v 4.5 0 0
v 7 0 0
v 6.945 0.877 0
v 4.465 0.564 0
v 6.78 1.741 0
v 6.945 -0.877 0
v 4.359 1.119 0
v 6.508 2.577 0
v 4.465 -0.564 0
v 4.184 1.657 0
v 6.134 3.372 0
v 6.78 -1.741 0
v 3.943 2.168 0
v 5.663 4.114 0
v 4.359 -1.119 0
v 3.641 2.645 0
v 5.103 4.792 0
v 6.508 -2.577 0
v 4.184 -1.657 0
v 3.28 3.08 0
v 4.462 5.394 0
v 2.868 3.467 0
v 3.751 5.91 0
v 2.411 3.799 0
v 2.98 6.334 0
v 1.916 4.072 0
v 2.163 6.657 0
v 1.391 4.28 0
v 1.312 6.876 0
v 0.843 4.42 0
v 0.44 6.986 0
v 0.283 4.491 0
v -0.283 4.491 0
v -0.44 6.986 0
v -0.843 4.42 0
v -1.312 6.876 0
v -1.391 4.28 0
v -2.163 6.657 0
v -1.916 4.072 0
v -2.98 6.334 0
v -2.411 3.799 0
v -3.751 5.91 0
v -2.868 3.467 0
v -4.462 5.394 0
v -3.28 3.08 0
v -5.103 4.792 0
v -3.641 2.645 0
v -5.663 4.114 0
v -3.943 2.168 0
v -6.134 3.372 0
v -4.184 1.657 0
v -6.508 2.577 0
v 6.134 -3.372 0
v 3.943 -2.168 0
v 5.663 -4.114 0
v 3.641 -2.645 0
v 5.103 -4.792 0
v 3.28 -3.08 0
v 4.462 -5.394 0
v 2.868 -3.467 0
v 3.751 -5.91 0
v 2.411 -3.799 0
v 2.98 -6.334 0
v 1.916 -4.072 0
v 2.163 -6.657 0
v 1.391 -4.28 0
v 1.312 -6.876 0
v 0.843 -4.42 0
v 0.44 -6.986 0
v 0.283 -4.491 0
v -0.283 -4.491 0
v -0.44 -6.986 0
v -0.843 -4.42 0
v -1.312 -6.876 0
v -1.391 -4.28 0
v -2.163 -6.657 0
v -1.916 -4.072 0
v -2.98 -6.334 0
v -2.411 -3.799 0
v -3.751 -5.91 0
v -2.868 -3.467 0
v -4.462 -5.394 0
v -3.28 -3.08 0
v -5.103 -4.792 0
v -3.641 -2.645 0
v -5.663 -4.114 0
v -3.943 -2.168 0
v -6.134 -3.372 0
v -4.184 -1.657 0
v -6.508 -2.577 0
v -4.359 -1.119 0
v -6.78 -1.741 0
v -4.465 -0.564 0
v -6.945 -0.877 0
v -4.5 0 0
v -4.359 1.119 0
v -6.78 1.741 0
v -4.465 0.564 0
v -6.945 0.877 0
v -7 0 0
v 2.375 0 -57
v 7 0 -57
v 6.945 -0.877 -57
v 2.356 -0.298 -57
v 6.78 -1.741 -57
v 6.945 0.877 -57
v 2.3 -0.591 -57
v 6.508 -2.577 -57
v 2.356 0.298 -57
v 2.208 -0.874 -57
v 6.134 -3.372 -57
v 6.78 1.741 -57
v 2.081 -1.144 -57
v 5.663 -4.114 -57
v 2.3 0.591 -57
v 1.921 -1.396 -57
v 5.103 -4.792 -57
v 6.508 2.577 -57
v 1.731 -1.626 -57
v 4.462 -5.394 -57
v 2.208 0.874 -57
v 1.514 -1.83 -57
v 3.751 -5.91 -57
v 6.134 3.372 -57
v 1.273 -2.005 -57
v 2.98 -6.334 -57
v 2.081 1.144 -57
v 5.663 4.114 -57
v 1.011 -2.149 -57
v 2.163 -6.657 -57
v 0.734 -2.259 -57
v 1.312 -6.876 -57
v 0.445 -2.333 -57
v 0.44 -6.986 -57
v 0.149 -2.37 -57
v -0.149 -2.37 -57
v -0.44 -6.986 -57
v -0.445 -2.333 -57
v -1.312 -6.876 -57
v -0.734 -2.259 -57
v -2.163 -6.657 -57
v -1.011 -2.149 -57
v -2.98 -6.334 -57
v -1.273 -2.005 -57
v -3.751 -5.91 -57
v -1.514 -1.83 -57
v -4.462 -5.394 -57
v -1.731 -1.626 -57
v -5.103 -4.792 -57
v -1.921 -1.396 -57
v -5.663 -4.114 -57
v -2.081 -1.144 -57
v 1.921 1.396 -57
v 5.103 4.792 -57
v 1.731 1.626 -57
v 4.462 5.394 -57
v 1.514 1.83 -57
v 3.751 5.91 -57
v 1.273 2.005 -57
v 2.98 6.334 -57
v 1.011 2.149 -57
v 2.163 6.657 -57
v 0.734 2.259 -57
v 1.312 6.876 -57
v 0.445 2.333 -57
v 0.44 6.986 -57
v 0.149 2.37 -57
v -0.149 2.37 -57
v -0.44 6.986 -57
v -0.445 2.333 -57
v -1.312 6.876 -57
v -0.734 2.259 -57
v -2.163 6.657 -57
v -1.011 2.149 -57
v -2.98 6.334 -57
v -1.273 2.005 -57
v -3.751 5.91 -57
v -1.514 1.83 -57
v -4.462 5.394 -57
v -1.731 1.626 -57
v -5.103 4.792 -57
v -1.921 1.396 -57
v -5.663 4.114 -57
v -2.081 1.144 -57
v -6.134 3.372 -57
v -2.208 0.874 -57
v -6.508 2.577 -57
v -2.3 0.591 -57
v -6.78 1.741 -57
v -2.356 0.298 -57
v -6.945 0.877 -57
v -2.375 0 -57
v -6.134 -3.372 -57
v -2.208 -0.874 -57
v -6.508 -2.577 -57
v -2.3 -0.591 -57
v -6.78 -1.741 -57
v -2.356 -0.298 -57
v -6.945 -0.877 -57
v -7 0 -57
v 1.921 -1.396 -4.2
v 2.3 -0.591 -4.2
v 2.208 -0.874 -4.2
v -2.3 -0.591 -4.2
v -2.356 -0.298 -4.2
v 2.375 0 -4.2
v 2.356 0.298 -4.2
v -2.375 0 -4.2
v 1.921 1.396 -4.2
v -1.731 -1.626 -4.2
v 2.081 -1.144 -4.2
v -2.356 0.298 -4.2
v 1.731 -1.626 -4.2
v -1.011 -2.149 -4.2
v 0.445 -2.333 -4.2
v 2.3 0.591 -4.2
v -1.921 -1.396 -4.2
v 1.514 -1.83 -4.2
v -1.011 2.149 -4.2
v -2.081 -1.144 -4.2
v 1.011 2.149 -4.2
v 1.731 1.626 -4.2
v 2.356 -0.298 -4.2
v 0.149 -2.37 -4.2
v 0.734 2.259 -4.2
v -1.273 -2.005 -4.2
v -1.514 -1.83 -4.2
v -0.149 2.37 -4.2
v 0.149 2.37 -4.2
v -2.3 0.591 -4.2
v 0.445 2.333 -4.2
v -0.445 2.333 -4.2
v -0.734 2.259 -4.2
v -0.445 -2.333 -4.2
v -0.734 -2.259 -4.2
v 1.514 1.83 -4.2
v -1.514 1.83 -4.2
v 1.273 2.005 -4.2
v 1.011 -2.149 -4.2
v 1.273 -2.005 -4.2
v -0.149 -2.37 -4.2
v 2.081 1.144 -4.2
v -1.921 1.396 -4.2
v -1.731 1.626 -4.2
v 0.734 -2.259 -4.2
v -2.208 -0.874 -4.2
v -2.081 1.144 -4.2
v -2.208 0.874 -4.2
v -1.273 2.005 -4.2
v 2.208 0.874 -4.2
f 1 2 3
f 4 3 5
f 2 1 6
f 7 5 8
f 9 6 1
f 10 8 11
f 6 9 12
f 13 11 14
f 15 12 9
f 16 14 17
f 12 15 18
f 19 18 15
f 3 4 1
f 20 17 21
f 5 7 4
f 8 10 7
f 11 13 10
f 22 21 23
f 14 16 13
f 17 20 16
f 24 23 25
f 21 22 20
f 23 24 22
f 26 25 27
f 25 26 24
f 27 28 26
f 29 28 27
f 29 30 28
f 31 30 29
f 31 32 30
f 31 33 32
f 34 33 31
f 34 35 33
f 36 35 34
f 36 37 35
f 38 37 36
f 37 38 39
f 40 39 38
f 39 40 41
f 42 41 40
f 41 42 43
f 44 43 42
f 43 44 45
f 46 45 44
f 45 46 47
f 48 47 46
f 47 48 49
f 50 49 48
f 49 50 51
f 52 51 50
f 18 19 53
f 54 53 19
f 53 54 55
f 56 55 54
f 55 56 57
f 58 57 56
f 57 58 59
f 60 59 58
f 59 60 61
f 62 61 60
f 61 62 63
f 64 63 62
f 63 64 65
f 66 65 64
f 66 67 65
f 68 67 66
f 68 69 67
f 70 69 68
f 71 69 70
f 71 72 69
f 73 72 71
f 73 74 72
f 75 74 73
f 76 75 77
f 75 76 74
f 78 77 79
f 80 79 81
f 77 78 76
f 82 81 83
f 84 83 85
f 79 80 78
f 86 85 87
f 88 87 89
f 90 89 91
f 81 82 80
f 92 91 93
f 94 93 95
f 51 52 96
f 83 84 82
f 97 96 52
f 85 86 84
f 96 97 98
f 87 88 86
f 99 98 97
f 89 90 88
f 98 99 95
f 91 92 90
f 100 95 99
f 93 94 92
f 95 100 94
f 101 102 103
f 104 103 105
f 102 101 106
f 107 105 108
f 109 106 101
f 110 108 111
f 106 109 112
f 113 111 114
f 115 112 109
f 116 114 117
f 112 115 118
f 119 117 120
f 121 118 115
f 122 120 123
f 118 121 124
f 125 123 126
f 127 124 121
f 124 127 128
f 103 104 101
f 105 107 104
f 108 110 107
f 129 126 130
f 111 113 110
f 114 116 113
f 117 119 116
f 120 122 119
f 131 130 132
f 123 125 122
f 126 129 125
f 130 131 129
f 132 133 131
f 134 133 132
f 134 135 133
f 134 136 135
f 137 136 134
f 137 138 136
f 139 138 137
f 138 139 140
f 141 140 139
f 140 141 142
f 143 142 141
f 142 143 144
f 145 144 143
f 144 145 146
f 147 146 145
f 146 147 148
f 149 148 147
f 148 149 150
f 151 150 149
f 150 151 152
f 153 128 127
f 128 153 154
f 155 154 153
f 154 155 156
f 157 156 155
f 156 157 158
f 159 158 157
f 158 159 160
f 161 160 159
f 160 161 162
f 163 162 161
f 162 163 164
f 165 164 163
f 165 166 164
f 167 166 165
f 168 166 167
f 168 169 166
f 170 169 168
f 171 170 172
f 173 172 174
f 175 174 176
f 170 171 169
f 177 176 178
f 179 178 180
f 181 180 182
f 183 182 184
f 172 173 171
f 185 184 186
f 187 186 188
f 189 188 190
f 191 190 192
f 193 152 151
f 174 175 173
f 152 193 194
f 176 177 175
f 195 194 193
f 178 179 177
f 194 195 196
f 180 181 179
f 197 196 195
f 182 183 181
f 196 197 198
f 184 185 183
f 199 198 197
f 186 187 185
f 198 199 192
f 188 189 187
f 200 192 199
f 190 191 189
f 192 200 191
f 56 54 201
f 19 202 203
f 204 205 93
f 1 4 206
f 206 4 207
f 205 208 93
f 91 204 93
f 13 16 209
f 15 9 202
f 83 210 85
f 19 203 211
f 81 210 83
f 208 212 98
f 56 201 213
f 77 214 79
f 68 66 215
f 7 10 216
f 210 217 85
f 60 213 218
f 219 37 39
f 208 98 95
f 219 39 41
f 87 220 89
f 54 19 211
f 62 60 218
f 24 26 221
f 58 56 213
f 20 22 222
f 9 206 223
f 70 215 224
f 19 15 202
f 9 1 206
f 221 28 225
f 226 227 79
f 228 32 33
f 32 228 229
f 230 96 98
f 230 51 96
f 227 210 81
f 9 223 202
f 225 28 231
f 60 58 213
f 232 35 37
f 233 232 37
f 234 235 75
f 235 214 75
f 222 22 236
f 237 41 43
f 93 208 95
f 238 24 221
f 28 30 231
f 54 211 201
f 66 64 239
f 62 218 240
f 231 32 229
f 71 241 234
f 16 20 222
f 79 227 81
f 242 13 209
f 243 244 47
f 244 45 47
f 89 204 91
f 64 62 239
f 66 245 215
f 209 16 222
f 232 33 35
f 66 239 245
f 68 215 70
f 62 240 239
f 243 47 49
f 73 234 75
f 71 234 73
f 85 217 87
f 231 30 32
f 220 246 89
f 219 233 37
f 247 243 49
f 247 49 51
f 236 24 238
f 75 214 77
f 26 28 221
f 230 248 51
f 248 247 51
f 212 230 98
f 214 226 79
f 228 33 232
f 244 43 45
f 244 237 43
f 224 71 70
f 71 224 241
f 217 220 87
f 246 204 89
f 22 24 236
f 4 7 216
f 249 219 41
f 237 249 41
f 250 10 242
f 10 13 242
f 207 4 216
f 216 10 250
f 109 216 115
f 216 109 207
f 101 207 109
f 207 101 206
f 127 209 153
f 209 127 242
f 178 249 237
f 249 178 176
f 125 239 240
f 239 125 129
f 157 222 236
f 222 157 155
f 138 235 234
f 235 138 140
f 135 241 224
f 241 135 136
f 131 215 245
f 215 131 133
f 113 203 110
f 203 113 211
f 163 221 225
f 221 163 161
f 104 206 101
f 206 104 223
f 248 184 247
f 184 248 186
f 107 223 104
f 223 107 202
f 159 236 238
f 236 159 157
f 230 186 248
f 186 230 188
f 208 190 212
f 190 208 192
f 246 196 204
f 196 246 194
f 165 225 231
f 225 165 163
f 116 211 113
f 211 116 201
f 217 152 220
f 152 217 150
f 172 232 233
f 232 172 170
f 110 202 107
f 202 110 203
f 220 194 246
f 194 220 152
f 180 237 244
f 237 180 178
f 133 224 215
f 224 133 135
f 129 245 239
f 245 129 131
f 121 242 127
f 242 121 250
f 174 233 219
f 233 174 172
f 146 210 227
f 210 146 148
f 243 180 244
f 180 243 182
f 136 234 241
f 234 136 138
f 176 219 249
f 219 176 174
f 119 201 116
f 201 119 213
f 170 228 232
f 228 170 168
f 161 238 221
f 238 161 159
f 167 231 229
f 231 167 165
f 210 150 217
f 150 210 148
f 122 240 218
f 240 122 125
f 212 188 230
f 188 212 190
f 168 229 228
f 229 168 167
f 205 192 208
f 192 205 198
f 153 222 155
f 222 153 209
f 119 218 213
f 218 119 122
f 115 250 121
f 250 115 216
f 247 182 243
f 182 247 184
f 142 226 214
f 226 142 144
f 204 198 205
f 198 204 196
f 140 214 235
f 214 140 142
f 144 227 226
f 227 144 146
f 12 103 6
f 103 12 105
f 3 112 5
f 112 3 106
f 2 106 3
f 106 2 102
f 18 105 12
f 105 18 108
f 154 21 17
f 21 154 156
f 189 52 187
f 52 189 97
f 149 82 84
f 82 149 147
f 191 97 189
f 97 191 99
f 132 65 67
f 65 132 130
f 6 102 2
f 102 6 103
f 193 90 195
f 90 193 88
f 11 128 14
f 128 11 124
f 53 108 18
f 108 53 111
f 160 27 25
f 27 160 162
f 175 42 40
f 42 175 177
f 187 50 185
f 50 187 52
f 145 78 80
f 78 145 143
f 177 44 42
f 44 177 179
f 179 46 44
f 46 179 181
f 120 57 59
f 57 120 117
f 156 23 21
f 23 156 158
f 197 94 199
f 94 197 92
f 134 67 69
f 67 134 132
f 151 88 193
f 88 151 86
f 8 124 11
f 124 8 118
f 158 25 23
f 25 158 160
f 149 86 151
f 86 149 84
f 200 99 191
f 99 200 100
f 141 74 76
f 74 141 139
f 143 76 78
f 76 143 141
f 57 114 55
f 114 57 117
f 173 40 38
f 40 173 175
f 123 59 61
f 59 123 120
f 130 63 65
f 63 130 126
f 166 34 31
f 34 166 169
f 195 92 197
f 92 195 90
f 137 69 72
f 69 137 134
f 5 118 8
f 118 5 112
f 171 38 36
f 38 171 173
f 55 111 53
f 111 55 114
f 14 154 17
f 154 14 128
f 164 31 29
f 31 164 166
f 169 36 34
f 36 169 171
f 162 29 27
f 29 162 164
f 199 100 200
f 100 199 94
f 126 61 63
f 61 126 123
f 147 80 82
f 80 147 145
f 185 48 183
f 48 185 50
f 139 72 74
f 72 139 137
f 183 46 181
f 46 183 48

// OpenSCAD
$fn = 50;


difference() {
	union() {
		translate(v = [0, 0, -57.0000000000]) {
			cylinder(h = 57, r = 7.0000000000);
		}
		cylinder(h = 0, r = 13.0000000000);
	}
	union() {
		translate(v = [0, 0, 0]) {
			rotate(a = [0, 0, 0]) {
				difference() {
					union() {
						#translate(v = [0, 0, -57.0000000000]) {
							cylinder(h = 57, r = 2.2500000000);
						}
						#translate(v = [0, 0, -4.2000000000]) {
							cylinder(h = 4.2000000000, r = 7.0000000000, r1 = 2.3750000000, r2 = 4.5000000000);
						}
						#translate(v = [0, 0, -57.0000000000]) {
							cylinder(h = 57, r = 2.3750000000);
						}
						#translate(v = [0, 0, -57.0000000000]) {
							cylinder(h = 57, r = 2.2500000000);
						}
					}
					union();
				}
			}
		}
	}
}
